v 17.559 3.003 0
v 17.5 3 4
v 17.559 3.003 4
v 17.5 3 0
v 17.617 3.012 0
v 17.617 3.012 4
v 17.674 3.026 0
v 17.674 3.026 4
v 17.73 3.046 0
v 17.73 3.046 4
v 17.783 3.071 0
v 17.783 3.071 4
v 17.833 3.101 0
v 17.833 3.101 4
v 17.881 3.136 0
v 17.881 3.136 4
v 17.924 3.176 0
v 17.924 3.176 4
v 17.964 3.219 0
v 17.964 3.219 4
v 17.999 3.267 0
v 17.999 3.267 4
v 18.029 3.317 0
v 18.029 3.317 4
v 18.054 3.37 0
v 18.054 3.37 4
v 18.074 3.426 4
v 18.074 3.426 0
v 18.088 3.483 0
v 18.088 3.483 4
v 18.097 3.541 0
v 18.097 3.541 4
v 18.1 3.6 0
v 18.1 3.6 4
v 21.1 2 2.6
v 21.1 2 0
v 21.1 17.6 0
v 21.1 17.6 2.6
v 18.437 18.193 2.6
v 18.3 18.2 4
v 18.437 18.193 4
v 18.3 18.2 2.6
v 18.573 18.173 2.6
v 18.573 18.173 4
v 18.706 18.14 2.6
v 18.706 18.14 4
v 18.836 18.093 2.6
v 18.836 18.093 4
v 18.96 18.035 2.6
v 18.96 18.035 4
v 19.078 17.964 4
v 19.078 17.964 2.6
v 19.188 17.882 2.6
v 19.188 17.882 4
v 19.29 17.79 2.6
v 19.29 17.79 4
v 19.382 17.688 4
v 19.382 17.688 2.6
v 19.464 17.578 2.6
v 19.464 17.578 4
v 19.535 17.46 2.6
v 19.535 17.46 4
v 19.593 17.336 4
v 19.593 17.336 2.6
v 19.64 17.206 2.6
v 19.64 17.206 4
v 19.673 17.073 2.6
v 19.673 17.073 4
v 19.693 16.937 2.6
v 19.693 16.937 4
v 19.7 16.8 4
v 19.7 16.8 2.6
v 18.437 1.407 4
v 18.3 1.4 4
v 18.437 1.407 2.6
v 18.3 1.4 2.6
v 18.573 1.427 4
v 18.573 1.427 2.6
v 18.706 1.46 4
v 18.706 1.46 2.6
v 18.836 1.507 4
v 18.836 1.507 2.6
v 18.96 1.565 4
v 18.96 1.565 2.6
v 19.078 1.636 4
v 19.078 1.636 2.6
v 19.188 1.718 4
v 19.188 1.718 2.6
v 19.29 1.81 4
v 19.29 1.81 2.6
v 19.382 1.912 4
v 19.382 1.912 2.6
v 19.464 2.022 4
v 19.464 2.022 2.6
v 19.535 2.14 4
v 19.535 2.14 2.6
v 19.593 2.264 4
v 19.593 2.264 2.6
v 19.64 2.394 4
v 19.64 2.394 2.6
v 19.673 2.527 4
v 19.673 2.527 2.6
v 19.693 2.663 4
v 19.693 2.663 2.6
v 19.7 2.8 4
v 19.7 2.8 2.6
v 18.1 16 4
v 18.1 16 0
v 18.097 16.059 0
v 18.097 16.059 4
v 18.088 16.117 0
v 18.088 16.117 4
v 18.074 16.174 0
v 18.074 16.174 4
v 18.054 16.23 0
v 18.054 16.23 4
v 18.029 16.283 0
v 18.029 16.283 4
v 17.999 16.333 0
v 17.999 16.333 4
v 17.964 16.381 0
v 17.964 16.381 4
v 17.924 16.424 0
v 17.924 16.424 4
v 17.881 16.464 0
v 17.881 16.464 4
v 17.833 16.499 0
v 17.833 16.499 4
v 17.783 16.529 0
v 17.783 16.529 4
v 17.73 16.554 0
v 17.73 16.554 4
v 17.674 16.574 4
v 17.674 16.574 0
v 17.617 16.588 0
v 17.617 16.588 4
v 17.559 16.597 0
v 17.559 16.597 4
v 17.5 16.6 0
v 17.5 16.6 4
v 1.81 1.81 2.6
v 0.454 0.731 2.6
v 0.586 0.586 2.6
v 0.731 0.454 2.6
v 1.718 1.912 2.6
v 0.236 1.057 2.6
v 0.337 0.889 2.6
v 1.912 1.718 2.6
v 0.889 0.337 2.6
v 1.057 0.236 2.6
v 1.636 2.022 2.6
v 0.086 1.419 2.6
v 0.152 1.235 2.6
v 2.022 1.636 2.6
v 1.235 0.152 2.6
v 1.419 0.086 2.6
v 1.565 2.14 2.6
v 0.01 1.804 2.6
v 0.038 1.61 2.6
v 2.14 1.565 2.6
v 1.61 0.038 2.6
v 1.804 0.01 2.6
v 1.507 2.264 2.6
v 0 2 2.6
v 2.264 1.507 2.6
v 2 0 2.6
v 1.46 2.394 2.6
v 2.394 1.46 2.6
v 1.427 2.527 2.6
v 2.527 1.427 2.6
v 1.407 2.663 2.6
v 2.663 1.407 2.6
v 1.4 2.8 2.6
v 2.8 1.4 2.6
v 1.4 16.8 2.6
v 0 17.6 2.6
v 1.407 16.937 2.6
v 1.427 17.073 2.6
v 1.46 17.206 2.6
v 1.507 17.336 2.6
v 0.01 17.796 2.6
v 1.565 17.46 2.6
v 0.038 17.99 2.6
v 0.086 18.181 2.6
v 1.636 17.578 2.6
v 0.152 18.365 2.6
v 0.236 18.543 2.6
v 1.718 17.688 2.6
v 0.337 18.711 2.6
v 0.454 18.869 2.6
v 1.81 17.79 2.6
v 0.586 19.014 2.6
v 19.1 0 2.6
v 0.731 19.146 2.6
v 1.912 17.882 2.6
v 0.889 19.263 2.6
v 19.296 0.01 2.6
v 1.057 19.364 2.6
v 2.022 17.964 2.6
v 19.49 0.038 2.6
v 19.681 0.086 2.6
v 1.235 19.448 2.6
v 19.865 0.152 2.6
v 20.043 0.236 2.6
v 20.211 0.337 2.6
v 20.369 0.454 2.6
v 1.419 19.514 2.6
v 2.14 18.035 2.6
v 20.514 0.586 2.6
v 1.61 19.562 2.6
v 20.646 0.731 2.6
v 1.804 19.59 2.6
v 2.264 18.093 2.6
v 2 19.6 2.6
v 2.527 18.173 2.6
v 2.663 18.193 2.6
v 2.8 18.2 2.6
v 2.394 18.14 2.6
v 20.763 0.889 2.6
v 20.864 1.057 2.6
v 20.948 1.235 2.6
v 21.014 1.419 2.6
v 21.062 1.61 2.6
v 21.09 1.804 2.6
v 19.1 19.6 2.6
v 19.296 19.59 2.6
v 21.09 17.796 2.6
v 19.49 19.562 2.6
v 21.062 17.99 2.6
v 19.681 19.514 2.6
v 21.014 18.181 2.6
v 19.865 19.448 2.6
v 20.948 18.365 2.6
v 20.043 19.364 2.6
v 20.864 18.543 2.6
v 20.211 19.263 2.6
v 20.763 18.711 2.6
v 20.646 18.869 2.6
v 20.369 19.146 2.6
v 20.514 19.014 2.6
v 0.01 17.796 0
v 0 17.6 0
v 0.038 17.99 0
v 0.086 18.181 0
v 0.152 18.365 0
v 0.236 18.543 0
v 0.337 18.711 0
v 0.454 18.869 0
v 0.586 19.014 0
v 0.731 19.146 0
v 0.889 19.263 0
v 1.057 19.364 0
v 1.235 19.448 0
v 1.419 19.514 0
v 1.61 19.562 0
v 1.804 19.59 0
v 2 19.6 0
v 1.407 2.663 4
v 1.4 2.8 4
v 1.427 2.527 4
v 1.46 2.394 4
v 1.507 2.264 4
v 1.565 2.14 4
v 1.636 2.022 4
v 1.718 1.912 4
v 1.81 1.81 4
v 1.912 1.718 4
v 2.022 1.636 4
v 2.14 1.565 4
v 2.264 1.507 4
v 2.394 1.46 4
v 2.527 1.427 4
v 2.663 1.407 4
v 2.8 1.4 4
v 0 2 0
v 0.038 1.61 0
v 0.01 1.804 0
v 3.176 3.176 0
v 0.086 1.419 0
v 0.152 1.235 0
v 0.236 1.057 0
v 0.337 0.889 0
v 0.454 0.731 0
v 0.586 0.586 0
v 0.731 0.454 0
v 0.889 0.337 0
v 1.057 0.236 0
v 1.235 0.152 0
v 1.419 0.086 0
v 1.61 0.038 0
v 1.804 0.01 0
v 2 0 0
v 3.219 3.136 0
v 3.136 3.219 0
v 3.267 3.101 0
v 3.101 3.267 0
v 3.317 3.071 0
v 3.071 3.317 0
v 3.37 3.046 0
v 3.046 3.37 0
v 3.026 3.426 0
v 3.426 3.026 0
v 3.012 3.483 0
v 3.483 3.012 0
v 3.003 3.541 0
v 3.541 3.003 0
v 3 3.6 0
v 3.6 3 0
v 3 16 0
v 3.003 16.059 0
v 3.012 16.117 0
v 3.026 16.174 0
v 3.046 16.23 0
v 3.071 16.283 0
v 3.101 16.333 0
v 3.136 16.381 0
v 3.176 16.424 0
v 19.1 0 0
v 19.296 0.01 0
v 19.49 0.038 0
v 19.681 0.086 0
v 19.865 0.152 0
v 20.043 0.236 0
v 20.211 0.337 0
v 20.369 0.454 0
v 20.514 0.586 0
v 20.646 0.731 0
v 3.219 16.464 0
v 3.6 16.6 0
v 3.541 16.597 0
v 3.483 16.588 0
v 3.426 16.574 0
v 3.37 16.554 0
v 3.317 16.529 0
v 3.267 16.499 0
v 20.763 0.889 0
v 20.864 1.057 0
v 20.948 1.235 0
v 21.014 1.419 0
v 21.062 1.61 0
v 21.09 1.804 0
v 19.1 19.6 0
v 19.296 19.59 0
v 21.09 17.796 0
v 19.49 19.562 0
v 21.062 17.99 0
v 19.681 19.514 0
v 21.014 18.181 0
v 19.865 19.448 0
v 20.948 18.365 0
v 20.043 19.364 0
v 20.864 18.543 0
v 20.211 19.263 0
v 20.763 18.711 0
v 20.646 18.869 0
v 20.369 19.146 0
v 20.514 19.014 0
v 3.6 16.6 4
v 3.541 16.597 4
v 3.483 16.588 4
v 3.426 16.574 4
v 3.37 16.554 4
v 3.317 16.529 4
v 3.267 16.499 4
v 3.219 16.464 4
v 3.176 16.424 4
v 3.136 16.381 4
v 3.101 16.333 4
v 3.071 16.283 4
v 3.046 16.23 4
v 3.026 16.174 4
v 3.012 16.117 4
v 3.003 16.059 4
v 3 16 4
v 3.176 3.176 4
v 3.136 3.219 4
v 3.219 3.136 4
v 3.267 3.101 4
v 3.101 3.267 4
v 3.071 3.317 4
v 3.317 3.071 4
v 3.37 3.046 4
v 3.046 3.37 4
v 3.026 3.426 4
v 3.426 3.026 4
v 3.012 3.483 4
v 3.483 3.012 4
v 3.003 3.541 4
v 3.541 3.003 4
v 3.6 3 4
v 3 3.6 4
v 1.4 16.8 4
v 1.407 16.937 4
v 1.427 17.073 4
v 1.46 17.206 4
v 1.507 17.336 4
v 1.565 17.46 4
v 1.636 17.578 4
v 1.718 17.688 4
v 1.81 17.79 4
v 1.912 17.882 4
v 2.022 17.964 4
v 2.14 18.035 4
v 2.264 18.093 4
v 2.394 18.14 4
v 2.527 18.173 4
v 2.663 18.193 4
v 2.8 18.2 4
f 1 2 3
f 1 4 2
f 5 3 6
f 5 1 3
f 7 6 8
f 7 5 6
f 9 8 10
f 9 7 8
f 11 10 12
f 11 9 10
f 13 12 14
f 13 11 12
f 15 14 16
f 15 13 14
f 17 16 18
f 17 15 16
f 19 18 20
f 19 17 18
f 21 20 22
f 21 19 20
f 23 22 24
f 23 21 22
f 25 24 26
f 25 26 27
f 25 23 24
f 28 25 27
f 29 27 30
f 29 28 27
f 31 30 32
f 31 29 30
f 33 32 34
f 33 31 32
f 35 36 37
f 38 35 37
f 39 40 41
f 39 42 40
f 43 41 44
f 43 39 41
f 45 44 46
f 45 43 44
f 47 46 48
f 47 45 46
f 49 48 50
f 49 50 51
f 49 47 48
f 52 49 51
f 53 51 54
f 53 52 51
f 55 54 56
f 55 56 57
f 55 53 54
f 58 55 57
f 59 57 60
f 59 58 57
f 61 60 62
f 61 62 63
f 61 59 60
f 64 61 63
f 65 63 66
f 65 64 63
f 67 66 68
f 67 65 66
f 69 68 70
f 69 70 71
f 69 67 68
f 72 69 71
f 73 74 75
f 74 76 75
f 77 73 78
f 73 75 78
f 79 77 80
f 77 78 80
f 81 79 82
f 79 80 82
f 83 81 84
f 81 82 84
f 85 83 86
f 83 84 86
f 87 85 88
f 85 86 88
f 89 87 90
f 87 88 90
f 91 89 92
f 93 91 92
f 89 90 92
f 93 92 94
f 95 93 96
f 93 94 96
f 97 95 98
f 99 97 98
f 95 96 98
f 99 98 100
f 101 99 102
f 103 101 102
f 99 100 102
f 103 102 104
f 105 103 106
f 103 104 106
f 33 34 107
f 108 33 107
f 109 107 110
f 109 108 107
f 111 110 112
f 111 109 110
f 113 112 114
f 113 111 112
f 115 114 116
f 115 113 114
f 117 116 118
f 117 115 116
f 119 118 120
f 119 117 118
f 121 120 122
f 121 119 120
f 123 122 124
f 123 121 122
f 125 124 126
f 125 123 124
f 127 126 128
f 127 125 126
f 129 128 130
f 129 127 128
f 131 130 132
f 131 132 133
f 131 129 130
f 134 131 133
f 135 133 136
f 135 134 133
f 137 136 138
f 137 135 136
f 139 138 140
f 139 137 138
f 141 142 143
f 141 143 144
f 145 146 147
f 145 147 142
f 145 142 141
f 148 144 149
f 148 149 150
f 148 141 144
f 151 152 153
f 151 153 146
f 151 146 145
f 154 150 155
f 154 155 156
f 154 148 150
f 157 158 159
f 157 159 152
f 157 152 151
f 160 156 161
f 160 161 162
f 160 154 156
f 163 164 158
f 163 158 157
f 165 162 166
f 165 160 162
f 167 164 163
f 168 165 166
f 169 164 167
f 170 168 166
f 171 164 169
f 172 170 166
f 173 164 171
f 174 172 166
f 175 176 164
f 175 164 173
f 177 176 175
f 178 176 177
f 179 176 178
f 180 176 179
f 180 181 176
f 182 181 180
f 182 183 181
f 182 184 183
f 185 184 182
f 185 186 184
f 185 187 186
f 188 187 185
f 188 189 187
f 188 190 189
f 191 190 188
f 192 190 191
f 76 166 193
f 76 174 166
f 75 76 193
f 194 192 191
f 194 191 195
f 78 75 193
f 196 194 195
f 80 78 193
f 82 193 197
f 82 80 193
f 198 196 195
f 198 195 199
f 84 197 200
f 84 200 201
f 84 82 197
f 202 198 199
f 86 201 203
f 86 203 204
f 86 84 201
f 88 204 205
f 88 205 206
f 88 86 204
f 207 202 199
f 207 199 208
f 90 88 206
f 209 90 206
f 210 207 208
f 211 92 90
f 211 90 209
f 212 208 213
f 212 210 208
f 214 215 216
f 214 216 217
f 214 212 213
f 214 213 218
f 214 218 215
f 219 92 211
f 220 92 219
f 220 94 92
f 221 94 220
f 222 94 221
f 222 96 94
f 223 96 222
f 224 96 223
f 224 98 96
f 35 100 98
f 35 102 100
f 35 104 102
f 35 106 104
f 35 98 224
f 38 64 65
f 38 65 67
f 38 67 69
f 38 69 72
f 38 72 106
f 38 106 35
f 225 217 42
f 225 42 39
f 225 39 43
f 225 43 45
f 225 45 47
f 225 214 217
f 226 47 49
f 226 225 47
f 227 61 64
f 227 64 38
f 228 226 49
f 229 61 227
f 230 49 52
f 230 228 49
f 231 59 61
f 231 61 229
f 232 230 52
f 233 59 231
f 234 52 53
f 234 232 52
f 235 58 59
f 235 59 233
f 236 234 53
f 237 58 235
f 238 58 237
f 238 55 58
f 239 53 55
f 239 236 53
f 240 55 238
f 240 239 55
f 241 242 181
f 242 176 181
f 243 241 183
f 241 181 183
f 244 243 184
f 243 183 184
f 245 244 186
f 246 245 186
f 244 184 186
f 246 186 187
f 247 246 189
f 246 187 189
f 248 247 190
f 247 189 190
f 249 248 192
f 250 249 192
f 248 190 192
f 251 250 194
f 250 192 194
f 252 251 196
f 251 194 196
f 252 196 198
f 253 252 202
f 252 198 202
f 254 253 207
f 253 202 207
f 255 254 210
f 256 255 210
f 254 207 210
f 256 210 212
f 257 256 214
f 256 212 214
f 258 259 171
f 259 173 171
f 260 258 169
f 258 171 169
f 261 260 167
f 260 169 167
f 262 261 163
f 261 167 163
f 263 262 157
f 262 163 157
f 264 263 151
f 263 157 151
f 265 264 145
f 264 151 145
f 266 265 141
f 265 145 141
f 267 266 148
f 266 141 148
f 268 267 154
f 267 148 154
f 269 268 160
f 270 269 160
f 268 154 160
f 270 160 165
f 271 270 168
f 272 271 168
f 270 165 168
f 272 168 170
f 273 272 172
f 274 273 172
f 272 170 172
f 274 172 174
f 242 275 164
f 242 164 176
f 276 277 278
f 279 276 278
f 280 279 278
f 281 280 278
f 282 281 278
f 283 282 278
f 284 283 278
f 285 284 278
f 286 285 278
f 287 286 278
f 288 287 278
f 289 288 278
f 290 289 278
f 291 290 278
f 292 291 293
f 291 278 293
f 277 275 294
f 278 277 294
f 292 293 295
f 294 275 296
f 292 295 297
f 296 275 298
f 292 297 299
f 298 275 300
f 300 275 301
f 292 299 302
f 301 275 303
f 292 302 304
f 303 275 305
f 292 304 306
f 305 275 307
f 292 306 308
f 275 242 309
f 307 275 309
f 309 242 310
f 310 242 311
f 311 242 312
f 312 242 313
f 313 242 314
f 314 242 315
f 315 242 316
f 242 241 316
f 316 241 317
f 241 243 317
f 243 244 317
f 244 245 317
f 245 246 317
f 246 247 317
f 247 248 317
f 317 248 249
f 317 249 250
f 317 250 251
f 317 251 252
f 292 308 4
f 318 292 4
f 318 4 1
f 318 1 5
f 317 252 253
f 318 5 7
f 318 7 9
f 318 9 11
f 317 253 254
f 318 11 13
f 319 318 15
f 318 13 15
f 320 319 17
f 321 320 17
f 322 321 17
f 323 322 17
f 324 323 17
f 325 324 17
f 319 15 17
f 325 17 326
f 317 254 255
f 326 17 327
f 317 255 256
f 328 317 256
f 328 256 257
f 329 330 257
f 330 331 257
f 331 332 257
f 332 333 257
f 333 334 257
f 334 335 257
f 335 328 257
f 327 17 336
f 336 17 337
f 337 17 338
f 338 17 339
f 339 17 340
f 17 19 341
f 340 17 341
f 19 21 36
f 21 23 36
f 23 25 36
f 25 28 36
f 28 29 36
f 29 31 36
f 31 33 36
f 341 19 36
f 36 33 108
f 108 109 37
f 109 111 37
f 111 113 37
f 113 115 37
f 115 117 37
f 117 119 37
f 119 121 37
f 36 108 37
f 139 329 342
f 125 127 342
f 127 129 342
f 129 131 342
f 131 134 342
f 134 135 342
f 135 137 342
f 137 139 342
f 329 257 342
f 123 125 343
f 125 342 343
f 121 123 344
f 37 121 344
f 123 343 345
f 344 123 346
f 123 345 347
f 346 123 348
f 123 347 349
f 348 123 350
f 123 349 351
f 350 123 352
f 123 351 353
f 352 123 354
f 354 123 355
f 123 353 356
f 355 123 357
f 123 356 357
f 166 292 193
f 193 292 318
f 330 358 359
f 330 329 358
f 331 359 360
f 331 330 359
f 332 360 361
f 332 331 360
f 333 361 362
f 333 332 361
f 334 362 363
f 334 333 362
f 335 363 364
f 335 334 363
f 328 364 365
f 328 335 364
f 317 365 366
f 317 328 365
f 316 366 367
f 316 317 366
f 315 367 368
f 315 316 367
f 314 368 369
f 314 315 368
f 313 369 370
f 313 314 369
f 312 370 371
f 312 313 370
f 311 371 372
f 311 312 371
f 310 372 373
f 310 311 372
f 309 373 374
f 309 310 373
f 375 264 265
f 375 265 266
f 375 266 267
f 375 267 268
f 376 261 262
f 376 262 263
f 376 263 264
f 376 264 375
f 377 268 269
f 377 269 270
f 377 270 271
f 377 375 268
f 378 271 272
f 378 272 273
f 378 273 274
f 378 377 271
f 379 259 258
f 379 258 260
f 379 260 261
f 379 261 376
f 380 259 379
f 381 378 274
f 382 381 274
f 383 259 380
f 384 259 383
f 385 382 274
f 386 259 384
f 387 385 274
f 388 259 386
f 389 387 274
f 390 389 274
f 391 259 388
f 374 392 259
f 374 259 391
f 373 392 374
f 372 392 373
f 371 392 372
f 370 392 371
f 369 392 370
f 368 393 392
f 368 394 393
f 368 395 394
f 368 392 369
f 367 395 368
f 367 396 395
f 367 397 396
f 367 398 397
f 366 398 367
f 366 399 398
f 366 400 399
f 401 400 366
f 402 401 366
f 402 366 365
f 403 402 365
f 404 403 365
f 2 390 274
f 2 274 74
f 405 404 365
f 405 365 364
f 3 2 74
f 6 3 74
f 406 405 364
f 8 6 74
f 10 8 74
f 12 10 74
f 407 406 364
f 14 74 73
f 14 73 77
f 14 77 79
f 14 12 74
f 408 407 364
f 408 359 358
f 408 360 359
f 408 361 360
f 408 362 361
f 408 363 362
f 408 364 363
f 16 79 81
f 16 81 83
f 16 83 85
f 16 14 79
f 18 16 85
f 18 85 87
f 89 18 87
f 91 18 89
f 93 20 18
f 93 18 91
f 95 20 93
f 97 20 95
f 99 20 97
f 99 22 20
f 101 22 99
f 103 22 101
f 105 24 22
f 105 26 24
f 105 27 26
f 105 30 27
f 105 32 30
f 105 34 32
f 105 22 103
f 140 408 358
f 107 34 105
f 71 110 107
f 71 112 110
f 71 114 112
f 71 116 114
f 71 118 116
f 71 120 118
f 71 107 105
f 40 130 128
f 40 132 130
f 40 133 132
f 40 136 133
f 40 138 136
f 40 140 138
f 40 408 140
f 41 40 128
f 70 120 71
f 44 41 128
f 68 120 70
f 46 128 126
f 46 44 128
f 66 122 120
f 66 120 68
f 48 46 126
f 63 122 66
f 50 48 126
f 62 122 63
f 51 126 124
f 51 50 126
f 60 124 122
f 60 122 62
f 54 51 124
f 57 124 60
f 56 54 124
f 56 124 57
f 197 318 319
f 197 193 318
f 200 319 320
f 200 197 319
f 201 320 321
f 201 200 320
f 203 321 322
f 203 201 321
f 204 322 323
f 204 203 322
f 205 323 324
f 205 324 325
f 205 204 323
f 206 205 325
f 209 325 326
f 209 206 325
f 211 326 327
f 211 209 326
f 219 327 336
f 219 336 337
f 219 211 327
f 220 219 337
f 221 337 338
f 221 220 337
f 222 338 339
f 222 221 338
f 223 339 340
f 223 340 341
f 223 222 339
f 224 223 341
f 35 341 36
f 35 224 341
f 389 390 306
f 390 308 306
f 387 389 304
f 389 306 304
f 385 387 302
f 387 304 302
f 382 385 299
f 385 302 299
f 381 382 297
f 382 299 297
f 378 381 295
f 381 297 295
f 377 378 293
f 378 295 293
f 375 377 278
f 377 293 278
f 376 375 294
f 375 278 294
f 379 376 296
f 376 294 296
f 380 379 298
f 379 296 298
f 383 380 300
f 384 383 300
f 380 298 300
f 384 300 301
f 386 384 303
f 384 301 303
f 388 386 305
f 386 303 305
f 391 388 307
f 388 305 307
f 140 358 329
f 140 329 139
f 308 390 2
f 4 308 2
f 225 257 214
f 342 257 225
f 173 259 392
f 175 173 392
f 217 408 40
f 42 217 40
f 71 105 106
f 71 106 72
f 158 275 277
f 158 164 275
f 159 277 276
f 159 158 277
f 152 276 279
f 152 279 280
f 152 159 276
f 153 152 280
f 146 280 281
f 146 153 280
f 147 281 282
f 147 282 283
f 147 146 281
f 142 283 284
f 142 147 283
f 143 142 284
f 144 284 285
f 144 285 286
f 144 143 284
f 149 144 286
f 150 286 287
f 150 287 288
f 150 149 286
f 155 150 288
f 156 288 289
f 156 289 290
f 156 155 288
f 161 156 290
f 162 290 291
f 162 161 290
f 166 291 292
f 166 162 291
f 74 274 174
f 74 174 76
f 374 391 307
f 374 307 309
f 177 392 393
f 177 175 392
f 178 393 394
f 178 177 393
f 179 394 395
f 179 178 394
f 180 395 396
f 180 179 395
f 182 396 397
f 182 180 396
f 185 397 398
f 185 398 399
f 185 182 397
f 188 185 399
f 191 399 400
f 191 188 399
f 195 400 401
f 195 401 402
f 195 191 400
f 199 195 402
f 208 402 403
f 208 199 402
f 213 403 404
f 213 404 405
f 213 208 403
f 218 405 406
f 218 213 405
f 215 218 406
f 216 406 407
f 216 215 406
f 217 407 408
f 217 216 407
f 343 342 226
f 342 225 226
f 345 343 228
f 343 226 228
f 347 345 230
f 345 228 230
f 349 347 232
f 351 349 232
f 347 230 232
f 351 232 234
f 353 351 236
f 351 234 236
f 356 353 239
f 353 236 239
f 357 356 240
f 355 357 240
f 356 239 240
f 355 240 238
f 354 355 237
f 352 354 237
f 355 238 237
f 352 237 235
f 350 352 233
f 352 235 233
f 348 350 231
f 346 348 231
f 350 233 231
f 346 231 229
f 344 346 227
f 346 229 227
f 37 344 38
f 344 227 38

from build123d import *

# Parameters (mm, degrees)
F0_W     = 21.1
F0_H     = 19.6
F1_DEPTH = 4
F2_W     = 21.1
F2_H     = 19.6
F2_W_2   = 18.3
F2_H_2   = 16.8
F3_DEPTH = 1.4
F4_W     = 15.1
F4_H     = 13.6
F5_DEPTH = 25
F6_R     = 2
F7_R     = 0.6
F8_R     = 1.4


with BuildPart() as f1:
    # F0 (on Top) → F1 (new body)
    with BuildSketch(Plane.XY):
        with Locations((10.55, 9.8)):
            Rectangle(F0_W, F0_H)
    extrude(amount=F1_DEPTH)

    # F2 (on face) → F3 (cut)
    with BuildSketch(Plane.XY.offset(4)):
        with Locations((10.55, 9.8)):
            Rectangle(F2_W, F2_H)
        with Locations((10.55, 9.8)):
            Rectangle(F2_W_2, F2_H_2, mode=Mode.SUBTRACT)
    extrude(amount=-F3_DEPTH, mode=Mode.SUBTRACT)

    # F4 (on face) → F5 (cut)
    with BuildSketch(Plane.XY.offset(4)):
        with Locations((10.55, 9.8)):
            Rectangle(F4_W, F4_H)
    extrude(amount=-F5_DEPTH, mode=Mode.SUBTRACT)

    # F6
    f6_edges = [f1.edges().sort_by_distance(p)[0] for p in [
        (21.1, 19.6, 1.3),
        (21.1, 0, 1.3),
        (0, 0, 1.3),
        (0, 19.6, 1.3),
    ]]
    fillet(f6_edges, radius=F6_R)

    # F7
    f7_edges = [f1.edges().sort_by_distance(p)[0] for p in [
        (3, 16.6, 2),
        (18.1, 16.6, 2),
        (18.1, 3, 2),
        (3, 3, 2),
    ]]
    fillet(f7_edges, radius=F7_R)

    # F8
    f8_edges = [f1.edges().sort_by_distance(p)[0] for p in [
        (1.4, 1.4, 3.3),
        (19.7, 1.4, 3.3),
        (19.7, 18.2, 3.3),
        (1.4, 18.2, 3.3),
    ]]
    fillet(f8_edges, radius=F8_R)


solid = f1.part
